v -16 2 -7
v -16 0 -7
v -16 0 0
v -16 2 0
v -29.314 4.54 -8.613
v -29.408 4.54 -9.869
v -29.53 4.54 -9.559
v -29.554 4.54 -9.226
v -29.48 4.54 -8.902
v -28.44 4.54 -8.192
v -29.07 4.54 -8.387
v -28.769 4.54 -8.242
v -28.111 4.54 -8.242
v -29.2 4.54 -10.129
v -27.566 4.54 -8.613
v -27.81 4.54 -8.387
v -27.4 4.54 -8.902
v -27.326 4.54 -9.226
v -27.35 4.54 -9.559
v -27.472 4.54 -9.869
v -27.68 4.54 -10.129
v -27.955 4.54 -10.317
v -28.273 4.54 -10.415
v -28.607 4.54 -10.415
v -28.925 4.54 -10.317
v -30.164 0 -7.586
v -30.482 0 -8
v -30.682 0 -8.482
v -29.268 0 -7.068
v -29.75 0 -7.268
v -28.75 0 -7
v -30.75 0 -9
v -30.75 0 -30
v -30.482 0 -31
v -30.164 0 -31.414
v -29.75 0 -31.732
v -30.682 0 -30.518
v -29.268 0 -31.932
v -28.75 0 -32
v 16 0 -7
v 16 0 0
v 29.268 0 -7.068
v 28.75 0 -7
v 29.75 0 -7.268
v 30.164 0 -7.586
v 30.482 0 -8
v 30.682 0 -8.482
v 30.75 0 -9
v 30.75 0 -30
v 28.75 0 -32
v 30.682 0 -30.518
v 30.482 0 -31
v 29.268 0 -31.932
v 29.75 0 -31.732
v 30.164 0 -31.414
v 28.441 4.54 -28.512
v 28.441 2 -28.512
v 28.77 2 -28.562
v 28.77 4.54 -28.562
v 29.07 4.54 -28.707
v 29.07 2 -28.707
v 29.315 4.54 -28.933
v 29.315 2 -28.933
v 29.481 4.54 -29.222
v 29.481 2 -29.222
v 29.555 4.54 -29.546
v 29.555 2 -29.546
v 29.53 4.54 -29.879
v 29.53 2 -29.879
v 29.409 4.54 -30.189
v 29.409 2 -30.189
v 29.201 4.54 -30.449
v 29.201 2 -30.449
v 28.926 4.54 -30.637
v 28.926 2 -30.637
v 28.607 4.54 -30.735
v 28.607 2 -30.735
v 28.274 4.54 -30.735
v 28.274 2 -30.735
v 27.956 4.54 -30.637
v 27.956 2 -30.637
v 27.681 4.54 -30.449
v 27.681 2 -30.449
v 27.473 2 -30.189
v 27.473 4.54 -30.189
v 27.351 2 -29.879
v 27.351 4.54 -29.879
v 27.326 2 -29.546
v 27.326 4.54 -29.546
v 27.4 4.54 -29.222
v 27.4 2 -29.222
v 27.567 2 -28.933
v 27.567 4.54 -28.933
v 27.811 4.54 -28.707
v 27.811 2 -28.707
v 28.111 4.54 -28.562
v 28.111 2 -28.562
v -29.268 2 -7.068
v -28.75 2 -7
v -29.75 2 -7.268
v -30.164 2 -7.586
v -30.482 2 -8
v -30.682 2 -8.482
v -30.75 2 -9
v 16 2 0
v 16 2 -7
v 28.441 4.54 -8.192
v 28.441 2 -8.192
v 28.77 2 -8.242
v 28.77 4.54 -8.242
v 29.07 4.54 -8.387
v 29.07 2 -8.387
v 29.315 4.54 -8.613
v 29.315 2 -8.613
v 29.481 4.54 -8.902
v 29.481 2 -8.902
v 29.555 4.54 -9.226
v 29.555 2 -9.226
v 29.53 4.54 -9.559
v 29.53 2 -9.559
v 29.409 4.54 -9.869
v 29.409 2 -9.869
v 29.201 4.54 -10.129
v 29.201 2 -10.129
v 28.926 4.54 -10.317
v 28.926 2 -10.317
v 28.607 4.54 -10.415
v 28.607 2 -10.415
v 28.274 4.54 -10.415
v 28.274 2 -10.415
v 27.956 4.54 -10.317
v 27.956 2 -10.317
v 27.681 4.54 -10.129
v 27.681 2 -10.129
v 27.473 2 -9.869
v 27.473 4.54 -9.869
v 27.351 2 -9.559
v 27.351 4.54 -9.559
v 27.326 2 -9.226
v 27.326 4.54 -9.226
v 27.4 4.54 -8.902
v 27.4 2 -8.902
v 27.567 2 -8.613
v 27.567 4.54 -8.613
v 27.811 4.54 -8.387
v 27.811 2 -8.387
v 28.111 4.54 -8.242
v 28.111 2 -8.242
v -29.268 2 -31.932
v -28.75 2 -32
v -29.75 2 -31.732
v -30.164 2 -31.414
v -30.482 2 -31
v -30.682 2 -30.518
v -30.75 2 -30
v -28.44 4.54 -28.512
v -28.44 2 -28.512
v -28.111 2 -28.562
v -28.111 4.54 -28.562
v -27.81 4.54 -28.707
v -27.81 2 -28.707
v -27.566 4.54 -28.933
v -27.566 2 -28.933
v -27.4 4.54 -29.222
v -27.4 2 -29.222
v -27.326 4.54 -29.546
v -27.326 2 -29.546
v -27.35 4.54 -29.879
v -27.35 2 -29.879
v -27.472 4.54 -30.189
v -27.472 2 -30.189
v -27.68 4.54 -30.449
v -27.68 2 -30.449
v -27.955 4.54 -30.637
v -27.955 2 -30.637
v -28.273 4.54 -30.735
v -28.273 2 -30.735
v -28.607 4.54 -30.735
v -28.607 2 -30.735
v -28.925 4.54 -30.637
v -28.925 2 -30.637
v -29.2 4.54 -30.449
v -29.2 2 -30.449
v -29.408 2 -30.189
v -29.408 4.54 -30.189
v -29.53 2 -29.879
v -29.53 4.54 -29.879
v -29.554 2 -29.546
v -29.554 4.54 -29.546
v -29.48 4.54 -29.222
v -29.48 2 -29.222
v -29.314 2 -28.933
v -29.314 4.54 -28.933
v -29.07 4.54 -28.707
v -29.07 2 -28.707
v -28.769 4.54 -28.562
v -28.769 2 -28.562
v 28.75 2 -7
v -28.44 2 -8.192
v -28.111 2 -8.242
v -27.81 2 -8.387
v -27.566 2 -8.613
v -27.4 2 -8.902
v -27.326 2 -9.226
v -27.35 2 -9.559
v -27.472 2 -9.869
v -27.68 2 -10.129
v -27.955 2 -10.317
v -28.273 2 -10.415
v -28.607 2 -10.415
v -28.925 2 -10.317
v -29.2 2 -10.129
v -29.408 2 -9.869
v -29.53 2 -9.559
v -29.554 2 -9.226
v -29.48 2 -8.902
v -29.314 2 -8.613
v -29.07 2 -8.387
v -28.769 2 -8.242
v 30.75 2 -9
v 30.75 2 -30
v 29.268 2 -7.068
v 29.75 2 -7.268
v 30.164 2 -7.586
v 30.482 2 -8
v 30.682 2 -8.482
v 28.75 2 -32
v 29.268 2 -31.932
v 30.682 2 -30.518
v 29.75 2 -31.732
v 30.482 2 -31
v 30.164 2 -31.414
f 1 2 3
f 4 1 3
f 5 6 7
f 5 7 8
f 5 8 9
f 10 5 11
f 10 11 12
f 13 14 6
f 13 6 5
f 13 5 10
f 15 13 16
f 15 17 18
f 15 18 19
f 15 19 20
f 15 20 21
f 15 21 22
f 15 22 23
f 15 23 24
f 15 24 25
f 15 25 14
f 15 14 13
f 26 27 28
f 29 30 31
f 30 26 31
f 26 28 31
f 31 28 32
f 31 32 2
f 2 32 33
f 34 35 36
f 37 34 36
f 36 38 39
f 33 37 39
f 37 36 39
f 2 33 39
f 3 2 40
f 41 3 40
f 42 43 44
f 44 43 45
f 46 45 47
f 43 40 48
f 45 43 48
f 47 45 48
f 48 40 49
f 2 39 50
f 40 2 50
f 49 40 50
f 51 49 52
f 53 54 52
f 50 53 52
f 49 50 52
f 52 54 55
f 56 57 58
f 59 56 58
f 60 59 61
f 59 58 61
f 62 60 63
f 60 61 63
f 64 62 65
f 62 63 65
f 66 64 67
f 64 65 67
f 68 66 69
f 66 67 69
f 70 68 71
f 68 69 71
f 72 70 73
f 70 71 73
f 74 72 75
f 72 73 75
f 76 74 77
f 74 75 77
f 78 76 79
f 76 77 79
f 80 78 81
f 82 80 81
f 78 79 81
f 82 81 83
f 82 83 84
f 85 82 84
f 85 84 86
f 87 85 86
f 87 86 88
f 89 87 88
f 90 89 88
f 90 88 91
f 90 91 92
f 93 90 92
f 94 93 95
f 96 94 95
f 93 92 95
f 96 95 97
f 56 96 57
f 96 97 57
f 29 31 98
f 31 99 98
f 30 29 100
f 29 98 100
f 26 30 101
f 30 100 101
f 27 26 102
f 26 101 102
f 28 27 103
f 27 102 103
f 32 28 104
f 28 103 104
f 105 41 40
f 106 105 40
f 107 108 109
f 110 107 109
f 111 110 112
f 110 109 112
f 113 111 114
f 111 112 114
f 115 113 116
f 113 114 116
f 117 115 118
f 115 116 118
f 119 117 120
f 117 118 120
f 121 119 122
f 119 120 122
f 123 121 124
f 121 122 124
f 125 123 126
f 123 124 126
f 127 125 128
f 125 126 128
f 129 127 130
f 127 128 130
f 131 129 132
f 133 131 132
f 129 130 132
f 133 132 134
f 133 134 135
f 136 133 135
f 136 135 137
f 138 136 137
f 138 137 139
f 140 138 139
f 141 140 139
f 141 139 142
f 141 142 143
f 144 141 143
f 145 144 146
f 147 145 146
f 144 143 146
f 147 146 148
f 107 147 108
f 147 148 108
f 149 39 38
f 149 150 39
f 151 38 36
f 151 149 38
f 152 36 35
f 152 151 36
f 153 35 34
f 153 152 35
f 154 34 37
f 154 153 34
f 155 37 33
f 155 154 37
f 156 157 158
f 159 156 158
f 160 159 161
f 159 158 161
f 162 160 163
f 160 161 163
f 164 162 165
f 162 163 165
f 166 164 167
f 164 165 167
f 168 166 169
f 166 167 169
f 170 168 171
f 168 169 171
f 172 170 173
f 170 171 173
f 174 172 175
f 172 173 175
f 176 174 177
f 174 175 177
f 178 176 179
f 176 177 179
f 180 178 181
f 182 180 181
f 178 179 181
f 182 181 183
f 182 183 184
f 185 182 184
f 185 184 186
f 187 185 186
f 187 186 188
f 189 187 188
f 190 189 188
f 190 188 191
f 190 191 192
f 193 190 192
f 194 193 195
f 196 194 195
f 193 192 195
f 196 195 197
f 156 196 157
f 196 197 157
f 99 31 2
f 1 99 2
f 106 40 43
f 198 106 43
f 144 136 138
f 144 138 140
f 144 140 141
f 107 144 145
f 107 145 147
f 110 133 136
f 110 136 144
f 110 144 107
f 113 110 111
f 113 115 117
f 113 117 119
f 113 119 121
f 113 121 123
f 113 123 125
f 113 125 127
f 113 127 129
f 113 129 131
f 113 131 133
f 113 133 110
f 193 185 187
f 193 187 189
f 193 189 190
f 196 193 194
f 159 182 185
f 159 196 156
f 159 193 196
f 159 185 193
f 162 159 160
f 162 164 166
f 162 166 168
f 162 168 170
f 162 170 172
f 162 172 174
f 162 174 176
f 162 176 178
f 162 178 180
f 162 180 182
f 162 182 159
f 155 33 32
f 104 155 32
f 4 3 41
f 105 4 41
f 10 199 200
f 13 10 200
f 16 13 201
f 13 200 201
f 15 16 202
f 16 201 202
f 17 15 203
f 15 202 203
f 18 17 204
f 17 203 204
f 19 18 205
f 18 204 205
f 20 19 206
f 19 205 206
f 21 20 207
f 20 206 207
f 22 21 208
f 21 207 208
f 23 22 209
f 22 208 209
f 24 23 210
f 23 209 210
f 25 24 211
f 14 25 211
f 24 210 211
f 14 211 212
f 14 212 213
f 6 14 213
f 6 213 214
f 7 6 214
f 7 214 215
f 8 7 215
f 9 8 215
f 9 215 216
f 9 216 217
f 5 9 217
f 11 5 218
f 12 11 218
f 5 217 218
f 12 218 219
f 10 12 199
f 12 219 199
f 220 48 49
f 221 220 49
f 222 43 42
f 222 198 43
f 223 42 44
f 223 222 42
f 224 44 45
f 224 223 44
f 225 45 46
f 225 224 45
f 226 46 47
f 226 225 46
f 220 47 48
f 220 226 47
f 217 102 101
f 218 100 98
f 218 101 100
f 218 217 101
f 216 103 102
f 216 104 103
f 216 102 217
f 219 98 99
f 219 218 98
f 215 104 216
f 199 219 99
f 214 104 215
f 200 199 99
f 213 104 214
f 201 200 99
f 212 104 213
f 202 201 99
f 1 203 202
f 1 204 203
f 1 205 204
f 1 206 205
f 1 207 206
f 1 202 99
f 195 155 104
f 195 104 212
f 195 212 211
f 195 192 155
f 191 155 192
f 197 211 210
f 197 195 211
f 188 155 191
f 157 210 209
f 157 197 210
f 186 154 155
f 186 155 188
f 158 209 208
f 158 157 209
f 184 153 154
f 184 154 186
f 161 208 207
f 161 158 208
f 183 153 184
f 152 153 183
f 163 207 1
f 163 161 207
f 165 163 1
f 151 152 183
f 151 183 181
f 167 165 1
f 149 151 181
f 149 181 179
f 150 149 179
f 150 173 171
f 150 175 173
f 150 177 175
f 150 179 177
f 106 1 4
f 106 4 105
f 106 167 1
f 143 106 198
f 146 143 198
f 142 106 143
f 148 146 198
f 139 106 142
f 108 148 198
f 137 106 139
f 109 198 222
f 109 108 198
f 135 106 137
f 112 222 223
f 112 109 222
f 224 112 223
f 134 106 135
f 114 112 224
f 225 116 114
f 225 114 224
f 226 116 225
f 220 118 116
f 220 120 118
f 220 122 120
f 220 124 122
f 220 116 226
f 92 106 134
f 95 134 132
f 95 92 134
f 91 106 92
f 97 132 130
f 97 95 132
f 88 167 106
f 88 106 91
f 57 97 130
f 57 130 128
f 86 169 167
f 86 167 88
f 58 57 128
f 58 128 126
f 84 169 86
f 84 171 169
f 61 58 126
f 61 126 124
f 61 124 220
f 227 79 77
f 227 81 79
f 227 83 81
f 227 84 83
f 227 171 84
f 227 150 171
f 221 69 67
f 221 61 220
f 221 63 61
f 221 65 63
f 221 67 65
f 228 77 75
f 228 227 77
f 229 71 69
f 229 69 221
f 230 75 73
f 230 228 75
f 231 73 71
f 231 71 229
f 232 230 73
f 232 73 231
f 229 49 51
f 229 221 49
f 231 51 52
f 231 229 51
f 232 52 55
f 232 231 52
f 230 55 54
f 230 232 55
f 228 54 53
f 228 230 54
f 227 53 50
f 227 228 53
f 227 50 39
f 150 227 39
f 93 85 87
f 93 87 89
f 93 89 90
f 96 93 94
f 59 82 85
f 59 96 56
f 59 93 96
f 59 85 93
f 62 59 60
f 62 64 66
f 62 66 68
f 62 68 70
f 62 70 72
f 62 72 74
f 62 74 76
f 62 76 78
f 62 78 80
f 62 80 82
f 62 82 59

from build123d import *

# Parameters (mm, degrees)
BOSS_EXTRUDE1_DEPTH = 2
SKETCH4_R           = 1.1176
BOSS_EXTRUDE2_DEPTH = 2.54
FILLET1_R           = 2


with BuildPart() as part:
    # Sketch3 → Boss-Extrude1 (new body)
    with BuildSketch(Plane(origin=(0, 0, 0), x_dir=(1, 0, 0), z_dir=(0, 1, 0))):
        Polygon((-16, 0), (16, 0), (16, 7), (30.75, 7), (30.75, 32), (-30.75, 32), (-30.75, 7), (-16, 7), align=None)
    extrude(amount=BOSS_EXTRUDE1_DEPTH)

    # Sketch4 → Boss-Extrude2 (add)
    with BuildSketch(Plane(origin=(0, 2, 0), x_dir=(1, 0, 0), z_dir=(0, 1, 0))):
        with Locations(Location((-28.44, 9.31, 0), (0, 0, 270))):
            Circle(SKETCH4_R)
        with Locations(Location((-28.44, 29.63, 0), (0, 0, 270))):
            Circle(SKETCH4_R)
        with Locations(Location((28.44076, 29.63, 0), (0, 0, 270))):
            Circle(SKETCH4_R)
        with Locations(Location((28.44076, 9.31, 0), (0, 0, 270))):
            Circle(SKETCH4_R)
    extrude(amount=BOSS_EXTRUDE2_DEPTH)

    # Fillet1
    fillet1_edges = [part.edges().sort_by_distance(p)[0] for p in [
        (-30.75, 1, -7),
        (-30.75, 1, -32),
        (30.75, 1, -32),
        (30.75, 1, -7),
    ]]
    fillet(fillet1_edges, radius=FILLET1_R)


solid = part.part
